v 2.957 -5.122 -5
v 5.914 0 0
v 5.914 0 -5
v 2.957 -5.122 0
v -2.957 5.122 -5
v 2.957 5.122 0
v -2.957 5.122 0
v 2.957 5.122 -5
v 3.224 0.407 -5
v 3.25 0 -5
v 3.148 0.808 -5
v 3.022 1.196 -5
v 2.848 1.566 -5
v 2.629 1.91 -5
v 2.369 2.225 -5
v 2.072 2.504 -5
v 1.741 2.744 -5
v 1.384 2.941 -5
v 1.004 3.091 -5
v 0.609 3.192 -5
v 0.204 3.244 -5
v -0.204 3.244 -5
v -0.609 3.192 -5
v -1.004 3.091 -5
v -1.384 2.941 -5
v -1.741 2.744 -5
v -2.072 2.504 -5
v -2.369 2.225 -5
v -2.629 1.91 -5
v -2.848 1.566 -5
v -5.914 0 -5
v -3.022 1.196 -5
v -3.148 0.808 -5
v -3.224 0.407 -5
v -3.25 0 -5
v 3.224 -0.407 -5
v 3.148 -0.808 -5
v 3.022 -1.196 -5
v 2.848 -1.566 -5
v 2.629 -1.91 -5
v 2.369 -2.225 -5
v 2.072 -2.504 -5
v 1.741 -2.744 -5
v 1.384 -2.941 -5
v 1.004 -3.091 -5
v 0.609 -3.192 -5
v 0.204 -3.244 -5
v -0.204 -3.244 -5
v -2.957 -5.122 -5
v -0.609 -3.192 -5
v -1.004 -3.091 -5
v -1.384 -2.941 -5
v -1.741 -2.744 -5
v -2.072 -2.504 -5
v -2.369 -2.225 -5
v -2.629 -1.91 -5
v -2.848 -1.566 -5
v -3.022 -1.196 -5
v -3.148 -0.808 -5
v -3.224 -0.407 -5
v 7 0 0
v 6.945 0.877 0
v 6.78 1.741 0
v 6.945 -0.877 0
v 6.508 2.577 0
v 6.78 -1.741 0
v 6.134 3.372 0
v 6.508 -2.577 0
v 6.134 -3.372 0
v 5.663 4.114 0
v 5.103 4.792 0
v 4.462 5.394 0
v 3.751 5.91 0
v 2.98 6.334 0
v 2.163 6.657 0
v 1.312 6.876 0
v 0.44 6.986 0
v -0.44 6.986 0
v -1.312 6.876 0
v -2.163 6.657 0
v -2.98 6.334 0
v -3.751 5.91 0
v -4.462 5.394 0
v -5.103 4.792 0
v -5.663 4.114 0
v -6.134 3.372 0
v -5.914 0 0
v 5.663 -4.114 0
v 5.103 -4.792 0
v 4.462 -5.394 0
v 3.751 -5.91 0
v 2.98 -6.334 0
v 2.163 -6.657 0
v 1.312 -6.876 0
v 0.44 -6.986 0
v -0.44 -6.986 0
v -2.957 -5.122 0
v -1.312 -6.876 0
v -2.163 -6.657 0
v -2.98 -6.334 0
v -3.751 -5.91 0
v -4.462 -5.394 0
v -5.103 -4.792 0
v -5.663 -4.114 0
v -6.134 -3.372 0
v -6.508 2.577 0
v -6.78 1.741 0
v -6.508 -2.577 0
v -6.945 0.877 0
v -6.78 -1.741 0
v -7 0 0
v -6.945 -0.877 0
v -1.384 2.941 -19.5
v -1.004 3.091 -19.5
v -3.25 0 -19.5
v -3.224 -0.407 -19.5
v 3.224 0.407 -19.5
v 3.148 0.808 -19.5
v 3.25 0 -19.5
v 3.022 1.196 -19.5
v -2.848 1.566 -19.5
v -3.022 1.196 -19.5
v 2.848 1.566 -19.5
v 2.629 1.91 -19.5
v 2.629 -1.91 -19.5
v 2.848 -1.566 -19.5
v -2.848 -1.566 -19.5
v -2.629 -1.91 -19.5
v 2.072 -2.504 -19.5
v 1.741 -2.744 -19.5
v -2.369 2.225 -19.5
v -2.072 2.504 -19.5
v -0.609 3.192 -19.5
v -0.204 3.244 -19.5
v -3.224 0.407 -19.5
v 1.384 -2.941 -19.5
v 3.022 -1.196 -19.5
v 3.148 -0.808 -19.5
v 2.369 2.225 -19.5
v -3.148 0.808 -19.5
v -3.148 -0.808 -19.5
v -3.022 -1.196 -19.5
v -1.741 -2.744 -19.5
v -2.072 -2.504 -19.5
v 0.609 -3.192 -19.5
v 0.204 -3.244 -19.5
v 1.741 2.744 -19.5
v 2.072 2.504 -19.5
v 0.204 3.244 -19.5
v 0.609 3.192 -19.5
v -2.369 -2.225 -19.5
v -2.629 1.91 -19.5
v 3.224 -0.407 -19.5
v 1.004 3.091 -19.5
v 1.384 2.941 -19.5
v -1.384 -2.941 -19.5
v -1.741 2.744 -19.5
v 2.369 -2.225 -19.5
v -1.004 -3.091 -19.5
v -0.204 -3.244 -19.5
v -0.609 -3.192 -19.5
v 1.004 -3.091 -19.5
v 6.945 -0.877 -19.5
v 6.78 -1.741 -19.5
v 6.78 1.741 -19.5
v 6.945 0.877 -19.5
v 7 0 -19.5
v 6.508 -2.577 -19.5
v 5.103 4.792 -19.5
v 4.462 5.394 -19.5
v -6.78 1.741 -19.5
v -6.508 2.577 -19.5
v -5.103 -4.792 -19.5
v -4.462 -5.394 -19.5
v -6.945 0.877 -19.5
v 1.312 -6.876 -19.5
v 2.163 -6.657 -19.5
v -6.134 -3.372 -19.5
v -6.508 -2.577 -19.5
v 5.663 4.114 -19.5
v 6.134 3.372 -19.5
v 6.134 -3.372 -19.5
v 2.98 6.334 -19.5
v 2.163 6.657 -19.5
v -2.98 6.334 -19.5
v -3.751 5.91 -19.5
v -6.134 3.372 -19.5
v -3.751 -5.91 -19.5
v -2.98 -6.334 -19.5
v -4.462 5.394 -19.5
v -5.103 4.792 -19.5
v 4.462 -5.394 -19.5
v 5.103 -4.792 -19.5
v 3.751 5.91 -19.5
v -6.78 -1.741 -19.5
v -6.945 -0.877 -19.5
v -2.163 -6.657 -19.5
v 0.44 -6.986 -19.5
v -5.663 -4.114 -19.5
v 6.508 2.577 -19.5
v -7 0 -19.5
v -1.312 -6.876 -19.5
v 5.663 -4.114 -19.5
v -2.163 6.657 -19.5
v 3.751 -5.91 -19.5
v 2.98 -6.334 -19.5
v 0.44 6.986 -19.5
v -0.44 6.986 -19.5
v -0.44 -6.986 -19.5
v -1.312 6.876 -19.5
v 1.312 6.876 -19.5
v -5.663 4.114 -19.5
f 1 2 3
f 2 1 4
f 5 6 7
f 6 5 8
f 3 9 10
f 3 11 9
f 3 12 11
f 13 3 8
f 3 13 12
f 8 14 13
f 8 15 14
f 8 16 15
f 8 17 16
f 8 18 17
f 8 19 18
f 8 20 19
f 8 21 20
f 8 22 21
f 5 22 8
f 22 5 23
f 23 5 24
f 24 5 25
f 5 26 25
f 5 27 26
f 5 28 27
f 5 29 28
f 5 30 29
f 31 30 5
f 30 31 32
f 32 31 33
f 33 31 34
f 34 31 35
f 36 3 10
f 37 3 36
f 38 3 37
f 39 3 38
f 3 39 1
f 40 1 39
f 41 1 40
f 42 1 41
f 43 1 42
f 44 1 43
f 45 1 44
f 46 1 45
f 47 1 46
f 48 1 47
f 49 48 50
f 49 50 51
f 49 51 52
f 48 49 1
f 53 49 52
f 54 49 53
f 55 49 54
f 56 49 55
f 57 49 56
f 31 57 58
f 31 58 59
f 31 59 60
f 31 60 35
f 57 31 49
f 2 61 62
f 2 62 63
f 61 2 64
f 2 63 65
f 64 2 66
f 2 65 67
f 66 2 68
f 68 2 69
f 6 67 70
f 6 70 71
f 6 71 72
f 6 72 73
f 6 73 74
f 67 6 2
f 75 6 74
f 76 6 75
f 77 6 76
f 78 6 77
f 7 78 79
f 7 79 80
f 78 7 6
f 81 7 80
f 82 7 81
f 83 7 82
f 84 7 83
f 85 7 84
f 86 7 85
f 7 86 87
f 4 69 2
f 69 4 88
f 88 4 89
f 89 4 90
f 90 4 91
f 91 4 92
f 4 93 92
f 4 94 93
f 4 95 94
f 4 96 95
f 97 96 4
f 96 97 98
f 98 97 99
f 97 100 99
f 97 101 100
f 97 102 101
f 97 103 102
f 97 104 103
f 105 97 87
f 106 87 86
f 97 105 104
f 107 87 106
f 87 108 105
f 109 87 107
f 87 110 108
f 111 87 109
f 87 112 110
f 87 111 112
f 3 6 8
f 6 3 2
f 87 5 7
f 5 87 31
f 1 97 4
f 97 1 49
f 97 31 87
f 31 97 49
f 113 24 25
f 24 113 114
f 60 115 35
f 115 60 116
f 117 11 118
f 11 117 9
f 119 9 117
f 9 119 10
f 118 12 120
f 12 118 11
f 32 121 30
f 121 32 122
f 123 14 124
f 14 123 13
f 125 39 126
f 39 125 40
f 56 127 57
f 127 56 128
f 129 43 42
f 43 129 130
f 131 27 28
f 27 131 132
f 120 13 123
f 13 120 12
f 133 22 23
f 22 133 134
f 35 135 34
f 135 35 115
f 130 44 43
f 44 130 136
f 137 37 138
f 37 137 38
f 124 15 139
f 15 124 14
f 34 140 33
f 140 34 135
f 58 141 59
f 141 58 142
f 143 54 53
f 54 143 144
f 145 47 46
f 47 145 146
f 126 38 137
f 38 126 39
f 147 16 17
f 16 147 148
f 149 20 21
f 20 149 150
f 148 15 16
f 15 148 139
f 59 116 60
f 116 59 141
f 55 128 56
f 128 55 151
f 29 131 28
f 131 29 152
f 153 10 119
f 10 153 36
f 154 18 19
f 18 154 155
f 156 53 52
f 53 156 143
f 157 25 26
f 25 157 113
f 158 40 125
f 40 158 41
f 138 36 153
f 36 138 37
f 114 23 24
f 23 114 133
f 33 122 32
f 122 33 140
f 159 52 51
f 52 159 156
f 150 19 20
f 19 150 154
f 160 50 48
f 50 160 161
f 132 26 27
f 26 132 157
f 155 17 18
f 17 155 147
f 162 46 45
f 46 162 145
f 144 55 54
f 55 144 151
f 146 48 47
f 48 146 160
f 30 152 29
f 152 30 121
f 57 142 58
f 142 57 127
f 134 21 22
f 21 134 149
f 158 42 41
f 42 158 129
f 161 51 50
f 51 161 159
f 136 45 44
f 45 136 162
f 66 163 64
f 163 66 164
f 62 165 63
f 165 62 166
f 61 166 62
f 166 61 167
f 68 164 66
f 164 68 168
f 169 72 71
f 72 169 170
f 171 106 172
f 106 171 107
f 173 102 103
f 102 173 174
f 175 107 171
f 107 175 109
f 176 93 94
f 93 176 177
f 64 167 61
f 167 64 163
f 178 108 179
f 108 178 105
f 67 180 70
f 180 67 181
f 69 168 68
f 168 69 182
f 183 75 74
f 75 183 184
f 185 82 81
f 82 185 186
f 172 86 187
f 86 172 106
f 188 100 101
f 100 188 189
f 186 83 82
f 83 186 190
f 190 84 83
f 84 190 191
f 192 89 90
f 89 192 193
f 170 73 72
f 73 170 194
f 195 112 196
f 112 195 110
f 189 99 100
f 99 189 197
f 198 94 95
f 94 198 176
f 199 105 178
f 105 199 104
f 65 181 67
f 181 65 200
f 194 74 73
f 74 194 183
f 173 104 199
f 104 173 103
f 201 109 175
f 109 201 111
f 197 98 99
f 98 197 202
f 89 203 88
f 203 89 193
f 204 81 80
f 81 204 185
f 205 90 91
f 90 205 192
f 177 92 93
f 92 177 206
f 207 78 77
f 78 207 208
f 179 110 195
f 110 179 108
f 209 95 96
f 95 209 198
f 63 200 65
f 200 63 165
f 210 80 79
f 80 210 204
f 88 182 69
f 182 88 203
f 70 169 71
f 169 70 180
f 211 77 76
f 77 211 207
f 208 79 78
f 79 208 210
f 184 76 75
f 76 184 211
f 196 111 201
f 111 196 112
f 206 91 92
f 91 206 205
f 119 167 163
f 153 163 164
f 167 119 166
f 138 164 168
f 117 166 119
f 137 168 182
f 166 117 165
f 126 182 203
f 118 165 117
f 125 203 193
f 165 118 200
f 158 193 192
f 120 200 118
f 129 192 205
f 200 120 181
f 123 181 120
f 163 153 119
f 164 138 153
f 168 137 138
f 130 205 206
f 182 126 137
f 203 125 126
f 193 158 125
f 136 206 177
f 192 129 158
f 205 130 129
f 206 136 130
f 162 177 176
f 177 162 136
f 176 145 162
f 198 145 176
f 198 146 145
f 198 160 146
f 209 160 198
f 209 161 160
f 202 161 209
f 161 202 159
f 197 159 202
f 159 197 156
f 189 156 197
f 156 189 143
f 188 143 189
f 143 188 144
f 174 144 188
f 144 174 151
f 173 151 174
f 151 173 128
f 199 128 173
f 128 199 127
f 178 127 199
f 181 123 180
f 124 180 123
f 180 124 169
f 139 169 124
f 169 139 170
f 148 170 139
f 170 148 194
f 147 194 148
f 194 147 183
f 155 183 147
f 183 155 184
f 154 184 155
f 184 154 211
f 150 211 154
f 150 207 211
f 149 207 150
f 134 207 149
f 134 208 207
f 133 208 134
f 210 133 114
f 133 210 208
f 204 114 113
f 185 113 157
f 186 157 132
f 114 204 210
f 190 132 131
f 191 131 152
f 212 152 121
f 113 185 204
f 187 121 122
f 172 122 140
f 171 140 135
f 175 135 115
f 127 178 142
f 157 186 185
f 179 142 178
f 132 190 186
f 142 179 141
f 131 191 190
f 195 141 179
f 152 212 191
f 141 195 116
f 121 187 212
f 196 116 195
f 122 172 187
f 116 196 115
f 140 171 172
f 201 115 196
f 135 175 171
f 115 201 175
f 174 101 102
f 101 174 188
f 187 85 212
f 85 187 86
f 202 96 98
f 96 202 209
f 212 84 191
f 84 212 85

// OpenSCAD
$fn = 50;

difference() {
	union() {
		translate(v = [0, 0, -19.5]) {
			cylinder(h = 19.5, r = 7.0);
		}
	}
	union() {
		translate(v = [0, 0, 0]) {
			rotate(a = [0, 0, 0]) {
				difference() {
					union() {
						translate(v = [0, 0, -5]) {
							linear_extrude(height = 5) {
								polygon(points = [[5.914249999999999, 0.0], [2.957125, 5.1218907443321156], [-2.9571249999999982, 5.1218907443321156], [-5.914249999999999, 7.242867331857232e-16], [-2.9571250000000022, -5.121890744332115], [2.9571249999999956, -5.121890744332118]]);
							}
						}
					}
					union();
				}
			}
		}
		#translate(v = [0, 0, -100.0]) {
			cylinder(h = 200, r = 3.25);
		}
	}
}
